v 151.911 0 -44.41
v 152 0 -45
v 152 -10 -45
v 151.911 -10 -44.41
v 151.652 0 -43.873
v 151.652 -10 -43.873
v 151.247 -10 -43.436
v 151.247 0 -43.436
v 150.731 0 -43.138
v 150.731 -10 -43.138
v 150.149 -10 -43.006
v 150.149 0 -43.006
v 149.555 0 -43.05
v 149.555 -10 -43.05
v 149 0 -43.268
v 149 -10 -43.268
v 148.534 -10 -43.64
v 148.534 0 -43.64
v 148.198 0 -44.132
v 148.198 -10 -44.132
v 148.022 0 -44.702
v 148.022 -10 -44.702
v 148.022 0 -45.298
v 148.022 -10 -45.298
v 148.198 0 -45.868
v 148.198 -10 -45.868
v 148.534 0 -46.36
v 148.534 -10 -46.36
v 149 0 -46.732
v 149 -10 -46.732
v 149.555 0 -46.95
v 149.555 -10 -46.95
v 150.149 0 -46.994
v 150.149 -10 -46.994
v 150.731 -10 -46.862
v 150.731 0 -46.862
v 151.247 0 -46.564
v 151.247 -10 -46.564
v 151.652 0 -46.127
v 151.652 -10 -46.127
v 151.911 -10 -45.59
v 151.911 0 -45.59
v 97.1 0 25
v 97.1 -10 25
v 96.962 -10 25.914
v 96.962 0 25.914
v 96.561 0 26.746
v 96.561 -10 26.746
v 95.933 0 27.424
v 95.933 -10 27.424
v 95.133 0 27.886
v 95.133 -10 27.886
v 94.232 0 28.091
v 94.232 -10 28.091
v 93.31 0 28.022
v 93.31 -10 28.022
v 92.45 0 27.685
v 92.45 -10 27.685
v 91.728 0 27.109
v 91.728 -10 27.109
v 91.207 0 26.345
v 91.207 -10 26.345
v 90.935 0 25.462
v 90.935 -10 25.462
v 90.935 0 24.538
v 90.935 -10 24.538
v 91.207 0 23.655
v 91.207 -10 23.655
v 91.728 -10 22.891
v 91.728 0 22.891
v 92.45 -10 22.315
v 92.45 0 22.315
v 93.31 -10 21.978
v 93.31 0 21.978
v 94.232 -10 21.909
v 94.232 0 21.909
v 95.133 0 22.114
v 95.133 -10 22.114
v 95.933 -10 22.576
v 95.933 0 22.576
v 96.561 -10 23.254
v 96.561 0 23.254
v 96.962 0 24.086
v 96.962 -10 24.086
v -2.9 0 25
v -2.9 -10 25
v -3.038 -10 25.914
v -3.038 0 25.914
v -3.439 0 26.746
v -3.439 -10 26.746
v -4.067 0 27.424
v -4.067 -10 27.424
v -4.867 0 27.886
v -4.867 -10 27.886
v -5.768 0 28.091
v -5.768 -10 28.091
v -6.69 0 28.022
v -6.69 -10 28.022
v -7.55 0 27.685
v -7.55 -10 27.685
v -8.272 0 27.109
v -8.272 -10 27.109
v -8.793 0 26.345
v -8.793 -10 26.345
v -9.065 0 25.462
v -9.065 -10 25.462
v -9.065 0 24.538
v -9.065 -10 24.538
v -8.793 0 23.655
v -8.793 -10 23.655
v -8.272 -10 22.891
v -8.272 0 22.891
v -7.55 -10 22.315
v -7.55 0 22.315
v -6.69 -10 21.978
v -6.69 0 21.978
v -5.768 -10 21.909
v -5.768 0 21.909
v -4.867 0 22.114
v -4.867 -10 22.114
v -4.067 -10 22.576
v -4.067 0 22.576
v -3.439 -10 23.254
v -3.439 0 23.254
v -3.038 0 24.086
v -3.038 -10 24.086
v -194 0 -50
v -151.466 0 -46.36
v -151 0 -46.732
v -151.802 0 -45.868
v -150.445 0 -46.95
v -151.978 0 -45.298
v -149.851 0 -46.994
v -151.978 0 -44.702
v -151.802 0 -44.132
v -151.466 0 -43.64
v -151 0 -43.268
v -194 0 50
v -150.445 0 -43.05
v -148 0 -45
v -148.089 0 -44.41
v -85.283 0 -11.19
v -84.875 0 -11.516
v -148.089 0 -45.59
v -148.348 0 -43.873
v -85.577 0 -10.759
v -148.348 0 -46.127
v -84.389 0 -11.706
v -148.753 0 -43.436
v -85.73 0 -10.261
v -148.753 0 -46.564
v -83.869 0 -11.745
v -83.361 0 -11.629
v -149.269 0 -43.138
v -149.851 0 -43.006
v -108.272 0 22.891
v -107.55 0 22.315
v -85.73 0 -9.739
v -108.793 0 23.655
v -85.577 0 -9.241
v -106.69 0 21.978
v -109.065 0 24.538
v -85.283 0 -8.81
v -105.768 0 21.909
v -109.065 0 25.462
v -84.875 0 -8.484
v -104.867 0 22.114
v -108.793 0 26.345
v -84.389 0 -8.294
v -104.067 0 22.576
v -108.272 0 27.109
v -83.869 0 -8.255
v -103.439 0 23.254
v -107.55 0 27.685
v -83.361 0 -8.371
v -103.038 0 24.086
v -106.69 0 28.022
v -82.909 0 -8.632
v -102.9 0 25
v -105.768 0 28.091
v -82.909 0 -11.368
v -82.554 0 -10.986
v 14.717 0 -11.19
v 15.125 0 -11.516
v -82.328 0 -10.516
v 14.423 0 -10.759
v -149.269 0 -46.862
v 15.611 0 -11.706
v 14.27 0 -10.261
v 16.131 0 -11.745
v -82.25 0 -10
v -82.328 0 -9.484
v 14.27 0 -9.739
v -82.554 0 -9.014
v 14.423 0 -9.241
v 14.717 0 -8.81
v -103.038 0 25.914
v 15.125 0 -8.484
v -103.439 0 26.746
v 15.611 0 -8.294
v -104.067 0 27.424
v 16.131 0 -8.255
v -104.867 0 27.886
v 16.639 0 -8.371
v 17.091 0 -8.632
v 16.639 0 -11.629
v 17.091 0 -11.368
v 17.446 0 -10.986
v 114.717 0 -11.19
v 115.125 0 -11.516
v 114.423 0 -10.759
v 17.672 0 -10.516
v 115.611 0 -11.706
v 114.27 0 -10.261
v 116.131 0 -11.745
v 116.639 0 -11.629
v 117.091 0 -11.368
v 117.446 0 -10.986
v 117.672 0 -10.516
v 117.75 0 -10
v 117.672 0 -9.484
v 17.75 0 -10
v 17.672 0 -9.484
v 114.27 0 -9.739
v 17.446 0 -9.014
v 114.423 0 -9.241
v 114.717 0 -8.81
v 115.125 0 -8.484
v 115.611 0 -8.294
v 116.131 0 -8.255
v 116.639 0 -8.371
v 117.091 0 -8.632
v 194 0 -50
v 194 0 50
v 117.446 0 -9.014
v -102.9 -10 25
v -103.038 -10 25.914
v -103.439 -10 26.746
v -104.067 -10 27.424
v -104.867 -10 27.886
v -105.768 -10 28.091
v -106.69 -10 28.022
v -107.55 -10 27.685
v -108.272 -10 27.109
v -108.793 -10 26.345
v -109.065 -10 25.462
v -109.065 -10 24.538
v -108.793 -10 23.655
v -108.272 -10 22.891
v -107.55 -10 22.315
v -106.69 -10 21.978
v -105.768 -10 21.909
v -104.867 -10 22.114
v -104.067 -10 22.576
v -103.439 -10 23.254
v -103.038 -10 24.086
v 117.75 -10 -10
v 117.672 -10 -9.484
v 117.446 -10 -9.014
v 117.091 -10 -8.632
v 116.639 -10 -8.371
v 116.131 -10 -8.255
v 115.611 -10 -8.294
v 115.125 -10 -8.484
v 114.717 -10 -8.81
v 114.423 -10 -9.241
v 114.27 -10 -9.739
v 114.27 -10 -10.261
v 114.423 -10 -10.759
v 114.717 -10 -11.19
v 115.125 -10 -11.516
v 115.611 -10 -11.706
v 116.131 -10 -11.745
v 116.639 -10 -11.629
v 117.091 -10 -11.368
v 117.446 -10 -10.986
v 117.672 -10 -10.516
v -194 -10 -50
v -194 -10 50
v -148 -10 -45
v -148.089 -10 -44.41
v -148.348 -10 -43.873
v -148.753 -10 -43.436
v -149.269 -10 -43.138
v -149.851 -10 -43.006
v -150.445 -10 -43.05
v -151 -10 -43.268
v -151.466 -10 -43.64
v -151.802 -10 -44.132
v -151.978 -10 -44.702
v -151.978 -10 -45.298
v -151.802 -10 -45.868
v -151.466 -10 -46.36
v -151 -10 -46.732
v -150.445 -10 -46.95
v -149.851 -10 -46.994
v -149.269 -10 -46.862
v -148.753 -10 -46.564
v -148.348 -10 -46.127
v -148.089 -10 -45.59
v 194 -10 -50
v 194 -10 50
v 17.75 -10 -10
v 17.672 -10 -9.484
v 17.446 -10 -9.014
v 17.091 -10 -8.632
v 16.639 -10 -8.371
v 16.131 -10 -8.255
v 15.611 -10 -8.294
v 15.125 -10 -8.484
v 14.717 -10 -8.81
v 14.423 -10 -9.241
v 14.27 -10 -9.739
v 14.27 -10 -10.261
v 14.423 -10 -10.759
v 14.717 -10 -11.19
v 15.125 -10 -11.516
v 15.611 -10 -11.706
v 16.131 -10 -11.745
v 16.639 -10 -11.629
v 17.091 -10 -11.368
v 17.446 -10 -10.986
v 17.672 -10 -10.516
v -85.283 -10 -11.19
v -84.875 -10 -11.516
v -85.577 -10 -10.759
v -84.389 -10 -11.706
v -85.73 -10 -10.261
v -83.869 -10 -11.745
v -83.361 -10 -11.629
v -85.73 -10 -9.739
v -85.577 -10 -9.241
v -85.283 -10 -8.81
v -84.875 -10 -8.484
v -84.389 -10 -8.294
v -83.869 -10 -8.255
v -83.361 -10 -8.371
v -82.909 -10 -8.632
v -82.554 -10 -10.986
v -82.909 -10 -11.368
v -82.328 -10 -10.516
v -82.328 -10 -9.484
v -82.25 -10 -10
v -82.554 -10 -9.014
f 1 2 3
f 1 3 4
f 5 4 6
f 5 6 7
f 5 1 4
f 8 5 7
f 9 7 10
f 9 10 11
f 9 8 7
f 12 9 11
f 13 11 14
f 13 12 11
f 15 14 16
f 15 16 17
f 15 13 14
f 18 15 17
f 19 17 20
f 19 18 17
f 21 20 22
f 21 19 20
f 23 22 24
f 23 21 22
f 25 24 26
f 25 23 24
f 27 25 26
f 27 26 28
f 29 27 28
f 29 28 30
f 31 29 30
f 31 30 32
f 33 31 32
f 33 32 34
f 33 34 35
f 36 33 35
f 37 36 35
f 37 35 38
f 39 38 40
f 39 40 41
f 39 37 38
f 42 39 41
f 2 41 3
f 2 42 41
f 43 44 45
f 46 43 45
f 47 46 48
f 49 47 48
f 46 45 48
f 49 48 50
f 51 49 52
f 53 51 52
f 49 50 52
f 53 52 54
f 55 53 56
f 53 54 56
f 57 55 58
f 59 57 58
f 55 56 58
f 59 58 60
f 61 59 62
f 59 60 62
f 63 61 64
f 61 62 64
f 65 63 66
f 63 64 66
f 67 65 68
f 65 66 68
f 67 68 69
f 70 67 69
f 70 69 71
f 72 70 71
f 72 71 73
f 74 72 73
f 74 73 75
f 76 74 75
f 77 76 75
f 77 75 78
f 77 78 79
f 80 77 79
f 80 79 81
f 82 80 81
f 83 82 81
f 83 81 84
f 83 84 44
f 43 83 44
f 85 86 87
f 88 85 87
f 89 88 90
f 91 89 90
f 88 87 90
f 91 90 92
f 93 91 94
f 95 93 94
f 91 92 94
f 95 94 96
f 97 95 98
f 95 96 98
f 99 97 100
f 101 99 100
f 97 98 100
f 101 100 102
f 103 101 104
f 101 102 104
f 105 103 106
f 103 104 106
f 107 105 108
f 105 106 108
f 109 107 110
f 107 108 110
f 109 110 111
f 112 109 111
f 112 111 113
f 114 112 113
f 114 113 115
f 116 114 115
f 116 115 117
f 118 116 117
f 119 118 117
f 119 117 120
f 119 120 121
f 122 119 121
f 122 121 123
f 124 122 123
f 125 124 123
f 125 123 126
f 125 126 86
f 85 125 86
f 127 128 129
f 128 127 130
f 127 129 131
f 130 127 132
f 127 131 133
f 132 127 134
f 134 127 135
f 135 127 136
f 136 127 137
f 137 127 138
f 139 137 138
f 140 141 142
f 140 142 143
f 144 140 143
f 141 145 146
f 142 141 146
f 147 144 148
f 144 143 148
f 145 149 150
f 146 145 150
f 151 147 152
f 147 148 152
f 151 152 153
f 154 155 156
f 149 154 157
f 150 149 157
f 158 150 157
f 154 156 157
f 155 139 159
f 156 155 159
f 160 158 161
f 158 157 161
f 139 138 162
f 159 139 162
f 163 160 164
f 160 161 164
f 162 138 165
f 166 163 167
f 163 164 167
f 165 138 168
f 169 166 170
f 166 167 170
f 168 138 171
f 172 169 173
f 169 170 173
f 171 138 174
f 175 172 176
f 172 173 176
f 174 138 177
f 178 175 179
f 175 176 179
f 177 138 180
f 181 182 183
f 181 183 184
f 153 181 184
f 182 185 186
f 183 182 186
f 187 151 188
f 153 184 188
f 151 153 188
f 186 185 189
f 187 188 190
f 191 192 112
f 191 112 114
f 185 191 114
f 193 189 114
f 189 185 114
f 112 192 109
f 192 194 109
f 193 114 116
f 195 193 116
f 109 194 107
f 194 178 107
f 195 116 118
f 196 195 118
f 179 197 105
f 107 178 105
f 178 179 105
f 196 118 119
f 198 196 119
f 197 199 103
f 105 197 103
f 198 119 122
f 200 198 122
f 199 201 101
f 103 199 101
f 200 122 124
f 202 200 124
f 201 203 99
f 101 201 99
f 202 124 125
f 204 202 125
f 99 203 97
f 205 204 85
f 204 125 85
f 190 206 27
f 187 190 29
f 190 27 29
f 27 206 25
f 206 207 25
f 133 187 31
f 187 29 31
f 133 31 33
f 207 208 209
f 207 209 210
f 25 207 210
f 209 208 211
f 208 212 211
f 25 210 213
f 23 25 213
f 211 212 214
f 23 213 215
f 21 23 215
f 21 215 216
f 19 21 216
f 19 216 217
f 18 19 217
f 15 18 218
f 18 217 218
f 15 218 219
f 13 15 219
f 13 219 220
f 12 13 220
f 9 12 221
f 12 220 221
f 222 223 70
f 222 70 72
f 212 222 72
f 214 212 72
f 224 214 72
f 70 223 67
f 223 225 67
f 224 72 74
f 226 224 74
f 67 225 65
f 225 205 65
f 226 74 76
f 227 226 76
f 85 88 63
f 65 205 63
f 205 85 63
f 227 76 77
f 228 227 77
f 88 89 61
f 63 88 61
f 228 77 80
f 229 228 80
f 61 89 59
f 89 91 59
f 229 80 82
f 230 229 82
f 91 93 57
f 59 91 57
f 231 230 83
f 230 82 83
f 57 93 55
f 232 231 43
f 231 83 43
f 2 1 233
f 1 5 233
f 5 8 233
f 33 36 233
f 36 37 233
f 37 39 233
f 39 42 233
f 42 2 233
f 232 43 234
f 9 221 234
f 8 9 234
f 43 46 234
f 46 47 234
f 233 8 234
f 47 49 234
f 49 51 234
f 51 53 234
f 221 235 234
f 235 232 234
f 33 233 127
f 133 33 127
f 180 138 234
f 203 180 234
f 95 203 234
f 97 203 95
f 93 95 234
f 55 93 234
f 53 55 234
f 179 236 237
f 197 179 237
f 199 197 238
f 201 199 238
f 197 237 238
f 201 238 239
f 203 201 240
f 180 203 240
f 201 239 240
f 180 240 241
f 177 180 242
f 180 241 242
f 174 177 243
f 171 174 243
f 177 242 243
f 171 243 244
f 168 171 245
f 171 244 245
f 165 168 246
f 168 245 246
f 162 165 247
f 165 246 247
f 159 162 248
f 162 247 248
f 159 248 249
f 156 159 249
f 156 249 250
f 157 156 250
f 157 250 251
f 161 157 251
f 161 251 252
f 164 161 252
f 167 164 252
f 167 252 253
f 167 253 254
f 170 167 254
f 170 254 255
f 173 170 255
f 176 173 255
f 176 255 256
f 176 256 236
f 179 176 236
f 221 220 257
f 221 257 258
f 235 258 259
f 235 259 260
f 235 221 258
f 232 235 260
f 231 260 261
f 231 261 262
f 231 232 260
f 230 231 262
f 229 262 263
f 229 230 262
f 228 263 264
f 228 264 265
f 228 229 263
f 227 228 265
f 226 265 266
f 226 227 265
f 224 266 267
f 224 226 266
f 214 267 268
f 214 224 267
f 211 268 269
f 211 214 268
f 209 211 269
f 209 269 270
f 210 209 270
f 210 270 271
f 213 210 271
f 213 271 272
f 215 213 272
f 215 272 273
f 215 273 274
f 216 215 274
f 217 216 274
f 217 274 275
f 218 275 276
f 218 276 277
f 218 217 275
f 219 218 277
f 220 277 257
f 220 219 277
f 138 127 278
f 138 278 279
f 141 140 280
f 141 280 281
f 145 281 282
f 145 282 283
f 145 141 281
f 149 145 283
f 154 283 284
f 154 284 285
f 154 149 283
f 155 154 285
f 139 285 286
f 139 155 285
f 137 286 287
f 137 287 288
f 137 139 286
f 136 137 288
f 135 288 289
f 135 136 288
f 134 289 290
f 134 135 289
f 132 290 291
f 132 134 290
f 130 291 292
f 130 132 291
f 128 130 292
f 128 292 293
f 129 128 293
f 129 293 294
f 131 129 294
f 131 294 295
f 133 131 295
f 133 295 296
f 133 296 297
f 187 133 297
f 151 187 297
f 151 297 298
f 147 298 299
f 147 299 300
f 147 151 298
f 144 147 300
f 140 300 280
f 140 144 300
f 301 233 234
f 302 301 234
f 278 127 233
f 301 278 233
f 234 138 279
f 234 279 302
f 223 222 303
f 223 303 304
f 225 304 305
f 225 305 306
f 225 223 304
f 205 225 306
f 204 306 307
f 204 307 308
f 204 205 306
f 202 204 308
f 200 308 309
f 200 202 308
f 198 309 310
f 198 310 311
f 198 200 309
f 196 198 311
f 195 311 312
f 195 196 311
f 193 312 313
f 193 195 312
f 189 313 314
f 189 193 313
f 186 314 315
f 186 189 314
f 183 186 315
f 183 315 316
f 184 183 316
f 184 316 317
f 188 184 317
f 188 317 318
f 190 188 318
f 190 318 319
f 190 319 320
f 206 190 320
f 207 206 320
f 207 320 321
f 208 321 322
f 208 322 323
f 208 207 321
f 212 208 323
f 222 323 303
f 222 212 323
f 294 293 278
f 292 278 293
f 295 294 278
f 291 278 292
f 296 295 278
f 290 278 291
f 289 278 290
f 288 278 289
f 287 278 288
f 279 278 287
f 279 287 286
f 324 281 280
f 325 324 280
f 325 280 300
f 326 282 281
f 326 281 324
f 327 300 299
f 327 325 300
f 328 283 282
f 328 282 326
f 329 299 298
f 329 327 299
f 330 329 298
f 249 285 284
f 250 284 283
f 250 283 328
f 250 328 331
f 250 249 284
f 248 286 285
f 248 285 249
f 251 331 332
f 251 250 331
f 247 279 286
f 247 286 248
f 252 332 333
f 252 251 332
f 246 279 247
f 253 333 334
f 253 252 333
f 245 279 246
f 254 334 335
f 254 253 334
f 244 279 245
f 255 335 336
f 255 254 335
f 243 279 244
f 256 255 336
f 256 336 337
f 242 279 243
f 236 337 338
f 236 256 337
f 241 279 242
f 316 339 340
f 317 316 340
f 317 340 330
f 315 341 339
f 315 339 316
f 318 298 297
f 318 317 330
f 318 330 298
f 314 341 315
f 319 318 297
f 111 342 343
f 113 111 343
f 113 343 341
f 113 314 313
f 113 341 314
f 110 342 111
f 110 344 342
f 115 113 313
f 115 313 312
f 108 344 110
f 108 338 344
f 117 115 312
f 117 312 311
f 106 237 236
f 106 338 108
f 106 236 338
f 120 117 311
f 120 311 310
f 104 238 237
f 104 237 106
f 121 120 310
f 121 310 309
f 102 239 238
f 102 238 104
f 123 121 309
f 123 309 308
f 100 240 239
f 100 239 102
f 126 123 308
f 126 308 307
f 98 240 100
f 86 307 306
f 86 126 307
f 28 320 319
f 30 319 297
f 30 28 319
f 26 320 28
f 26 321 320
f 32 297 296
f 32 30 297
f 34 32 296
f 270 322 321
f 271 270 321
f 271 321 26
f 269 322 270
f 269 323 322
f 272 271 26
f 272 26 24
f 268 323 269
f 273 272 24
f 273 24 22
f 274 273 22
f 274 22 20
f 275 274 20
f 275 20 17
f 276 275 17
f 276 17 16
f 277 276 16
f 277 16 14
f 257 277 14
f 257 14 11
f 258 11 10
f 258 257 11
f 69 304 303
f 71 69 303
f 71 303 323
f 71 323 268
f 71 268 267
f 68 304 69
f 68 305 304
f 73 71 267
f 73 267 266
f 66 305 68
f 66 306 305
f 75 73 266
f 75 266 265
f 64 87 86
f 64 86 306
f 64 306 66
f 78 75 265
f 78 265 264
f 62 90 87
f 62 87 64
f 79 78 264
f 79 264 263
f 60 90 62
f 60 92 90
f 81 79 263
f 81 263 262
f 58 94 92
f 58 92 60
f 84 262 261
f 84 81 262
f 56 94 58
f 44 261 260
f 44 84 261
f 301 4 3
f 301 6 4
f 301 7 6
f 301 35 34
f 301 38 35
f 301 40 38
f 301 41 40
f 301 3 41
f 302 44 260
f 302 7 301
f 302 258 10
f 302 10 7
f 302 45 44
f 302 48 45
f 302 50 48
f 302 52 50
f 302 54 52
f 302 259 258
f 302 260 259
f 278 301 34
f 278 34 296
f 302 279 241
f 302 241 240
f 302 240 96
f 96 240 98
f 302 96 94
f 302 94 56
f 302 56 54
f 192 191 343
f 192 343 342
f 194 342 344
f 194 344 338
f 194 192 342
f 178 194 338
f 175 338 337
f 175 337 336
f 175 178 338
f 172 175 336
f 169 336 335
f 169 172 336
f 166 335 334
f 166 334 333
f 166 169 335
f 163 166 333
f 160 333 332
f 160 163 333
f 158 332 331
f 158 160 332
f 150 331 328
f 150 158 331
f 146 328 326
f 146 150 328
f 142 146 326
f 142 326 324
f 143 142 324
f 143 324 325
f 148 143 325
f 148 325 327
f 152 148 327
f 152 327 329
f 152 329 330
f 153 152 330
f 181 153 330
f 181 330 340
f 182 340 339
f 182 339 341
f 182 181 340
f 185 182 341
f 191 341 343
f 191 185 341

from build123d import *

# Parameters (mm, degrees)
F0_W     = 388
F0_H     = 100
F0_R     = 2
F0_R_2   = 1.75
F1_DEPTH = 10
F2_R     = 3.1
F3_DEPTH = 25


with BuildPart() as f1:
    # F0 (on Front) → F1 (new body)
    with BuildSketch(Plane.XZ):
        Rectangle(F0_W, F0_H)
        with Locations((-150, -45)):
            Circle(F0_R, mode=Mode.SUBTRACT)
        with Locations((-84, -10)):
            Circle(F0_R_2, mode=Mode.SUBTRACT)
        with Locations((150, -45)):
            Circle(F0_R, mode=Mode.SUBTRACT)
        with Locations((16, -10)):
            Circle(F0_R_2, mode=Mode.SUBTRACT)
        with Locations((116, -10)):
            Circle(F0_R_2, mode=Mode.SUBTRACT)
    extrude(amount=F1_DEPTH)

    # F2 (on face) → F3 (cut)
    with BuildSketch(Plane.XZ.offset(10)):
        with Locations((-6, 25)):
            Circle(F2_R)
        with Locations((94, 25)):
            Circle(F2_R)
        with Locations((-106, 25)):
            Circle(F2_R)
    extrude(amount=-F3_DEPTH, mode=Mode.SUBTRACT)


solid = f1.part
